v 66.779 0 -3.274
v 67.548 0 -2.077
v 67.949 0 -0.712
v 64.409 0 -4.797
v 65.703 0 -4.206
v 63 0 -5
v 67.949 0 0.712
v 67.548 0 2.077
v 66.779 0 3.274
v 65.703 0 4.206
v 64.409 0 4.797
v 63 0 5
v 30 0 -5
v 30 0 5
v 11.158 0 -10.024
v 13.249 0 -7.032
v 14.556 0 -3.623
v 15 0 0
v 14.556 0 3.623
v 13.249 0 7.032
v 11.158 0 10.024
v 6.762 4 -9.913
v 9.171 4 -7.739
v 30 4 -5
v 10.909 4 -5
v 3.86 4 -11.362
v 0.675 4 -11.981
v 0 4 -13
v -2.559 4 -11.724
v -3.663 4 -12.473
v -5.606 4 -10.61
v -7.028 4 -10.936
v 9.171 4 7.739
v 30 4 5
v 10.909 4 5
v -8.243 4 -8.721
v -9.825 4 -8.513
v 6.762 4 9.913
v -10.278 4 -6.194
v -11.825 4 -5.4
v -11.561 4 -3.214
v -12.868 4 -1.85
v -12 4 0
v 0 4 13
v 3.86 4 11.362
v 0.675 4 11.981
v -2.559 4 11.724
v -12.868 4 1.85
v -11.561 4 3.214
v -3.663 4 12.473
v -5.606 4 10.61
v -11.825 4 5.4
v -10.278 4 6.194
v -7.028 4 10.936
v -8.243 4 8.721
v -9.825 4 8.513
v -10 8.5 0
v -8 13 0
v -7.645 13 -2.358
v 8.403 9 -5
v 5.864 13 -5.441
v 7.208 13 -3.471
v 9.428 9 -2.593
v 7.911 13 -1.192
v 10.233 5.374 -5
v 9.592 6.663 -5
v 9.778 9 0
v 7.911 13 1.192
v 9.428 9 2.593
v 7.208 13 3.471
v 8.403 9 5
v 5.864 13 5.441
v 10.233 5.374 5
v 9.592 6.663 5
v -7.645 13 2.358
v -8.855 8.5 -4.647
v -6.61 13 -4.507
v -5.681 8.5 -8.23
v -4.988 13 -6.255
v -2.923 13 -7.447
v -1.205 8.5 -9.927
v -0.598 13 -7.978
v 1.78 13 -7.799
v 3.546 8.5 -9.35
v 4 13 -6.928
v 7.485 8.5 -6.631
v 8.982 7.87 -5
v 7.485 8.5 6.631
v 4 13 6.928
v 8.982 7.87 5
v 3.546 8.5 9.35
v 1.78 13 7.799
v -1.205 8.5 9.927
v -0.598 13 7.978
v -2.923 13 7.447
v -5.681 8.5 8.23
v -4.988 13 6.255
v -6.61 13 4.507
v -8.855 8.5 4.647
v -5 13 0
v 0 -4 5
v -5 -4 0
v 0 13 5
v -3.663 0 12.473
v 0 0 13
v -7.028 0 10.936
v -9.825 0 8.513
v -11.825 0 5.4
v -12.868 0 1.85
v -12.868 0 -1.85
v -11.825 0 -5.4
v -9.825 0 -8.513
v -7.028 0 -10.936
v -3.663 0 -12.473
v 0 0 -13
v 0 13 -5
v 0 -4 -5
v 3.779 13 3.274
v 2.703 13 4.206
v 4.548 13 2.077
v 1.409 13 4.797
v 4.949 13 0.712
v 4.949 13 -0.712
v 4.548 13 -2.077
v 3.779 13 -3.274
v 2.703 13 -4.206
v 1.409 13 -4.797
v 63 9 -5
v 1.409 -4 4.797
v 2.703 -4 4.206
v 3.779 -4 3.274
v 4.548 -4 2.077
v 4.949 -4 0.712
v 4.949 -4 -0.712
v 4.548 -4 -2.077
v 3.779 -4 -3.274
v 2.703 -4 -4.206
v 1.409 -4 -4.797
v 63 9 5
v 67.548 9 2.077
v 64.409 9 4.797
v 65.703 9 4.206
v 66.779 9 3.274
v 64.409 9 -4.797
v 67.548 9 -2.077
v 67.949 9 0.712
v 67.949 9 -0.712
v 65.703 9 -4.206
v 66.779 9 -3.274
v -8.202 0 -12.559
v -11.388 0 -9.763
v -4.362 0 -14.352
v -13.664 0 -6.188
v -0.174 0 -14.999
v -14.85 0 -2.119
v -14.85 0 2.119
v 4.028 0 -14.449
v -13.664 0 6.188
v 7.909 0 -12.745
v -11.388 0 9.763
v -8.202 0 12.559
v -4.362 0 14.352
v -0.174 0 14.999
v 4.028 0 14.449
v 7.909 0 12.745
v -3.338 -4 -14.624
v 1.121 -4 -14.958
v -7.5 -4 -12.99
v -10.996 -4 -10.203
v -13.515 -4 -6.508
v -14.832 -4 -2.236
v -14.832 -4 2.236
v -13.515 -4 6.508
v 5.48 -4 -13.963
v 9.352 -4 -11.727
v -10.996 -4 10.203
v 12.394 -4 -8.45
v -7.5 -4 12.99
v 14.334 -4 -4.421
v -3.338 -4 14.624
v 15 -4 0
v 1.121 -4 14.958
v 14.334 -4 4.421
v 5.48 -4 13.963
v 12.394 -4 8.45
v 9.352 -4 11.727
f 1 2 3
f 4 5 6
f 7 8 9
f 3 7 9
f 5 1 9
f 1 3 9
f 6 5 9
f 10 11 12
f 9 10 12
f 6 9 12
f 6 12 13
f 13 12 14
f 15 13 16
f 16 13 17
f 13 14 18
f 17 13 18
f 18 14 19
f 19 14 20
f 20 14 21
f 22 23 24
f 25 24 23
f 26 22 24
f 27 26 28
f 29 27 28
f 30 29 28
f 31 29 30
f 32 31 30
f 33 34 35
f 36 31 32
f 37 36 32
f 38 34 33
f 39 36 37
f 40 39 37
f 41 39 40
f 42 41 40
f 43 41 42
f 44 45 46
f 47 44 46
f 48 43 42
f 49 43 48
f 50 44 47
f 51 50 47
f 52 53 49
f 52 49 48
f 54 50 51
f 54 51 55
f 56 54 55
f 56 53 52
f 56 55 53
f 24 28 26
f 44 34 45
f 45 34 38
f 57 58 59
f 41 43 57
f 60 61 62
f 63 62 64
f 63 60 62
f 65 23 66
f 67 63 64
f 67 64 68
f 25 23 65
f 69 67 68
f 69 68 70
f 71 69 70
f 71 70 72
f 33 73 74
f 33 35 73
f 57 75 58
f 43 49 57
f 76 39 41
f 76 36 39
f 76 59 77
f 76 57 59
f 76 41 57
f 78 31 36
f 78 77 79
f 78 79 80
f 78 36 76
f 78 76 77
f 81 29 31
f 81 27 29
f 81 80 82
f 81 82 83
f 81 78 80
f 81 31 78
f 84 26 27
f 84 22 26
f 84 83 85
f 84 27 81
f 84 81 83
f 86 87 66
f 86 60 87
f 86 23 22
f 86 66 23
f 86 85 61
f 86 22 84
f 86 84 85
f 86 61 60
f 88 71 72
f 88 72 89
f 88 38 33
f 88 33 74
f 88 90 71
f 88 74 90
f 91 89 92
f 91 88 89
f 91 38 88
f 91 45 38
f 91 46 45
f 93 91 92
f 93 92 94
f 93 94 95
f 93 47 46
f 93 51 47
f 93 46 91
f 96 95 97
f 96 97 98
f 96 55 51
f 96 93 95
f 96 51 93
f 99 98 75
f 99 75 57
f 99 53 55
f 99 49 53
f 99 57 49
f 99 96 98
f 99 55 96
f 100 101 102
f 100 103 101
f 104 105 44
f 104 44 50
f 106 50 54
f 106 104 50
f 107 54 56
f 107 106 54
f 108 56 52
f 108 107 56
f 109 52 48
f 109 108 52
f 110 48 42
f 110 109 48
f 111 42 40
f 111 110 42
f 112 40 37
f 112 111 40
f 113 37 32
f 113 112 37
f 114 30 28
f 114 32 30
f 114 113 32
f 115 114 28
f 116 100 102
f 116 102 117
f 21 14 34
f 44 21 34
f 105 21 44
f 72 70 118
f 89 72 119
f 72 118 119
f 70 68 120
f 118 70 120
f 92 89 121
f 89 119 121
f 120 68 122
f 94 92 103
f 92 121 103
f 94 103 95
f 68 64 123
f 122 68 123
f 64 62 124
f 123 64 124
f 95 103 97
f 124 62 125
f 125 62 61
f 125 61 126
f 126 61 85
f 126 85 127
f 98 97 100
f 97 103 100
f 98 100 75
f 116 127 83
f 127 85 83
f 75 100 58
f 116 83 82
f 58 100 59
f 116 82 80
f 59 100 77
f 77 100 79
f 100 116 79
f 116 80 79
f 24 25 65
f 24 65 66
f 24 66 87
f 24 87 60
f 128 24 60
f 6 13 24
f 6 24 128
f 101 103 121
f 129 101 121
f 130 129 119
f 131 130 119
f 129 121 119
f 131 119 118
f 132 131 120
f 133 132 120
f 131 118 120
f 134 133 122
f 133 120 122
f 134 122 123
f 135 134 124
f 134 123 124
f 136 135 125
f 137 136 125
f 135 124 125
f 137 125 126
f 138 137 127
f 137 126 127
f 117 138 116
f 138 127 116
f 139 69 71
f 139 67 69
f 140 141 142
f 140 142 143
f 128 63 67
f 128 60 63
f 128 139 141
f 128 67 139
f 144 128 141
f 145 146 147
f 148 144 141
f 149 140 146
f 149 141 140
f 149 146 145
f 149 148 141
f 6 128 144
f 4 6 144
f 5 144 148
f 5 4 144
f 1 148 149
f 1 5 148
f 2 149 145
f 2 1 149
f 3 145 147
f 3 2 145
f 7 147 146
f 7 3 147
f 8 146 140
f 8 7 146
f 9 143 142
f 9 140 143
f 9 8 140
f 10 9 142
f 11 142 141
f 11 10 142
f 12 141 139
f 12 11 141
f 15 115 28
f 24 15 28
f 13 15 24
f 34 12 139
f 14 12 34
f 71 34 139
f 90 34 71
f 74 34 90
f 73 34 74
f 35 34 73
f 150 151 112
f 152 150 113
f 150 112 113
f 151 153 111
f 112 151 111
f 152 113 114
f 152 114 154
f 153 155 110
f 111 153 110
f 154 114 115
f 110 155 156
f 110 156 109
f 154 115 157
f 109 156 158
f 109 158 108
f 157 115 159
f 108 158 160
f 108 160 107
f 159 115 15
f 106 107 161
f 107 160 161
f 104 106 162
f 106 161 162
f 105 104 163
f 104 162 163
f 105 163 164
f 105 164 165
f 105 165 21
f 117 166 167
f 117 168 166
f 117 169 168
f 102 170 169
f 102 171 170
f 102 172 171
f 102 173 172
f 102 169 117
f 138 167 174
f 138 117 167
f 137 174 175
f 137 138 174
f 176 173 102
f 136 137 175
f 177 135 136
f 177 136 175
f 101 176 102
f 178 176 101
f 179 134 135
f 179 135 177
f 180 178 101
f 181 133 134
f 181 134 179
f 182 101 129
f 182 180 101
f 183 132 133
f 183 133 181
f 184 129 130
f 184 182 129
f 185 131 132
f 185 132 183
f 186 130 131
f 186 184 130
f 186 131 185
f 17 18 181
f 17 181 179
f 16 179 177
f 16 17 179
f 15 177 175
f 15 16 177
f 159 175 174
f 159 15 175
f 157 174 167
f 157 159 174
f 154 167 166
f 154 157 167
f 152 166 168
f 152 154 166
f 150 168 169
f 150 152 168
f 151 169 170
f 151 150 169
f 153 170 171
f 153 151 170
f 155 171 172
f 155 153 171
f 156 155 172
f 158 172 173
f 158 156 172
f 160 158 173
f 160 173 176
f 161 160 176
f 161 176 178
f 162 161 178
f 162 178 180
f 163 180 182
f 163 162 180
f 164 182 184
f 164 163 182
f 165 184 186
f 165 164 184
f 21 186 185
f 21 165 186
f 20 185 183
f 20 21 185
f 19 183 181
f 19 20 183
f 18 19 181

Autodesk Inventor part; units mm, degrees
ref_plane "YZ Plane" through (0, 0, 0) normal (1, 0, 0) x (0, 1, 0)
ref_plane "XZ Plane" through (0, 0, 0) normal (0, 1, 0) x (-1, 0, 0)
ref_plane "XY Plane" through (0, 0, 0) normal (0, 0, 1) x (1, 0, 0)
sketch "草图1" plane through (0, 0, 0) normal (0, 1, 0) x (-1, 0, 0)
  arc A0 (0, -13) -> (0, 13) centre (0, 0) ccw
  line L0 (0, 0) -> (-30, 0)
  line L1 (0, -13) -> (-30, -5)
  line L2 (-30, 5) -> (0, 13)
  line L3 (-30, 5) -> (-63, 5)
  line L4 (-63, -5) -> (-30, -5)
  arc A1 (-63, 5) -> (-63, -5) centre (-63, 0) ccw
  dimension "d0" = 26
  dimension "d10" = 10
extrude "拉伸1" add sketch "草图1" along normal blind 4
sketch "草图2" plane through (0, 0, 0) normal (0, -1, 0) x (1, 0, 0)
  line L0 (30, 5) -> (63, 5) projected
  line L1 (0, 13) -> (30, 5) projected
  arc A0 (0, 13) -> (0, -13) centre (0, 0) ccw projected
  line L2 (30, -5) -> (0, -13) projected
  line L3 (63, -5) -> (30, -5) projected
  circle A1 centre (0, 0) radius 15
  arc A2 (63, -5) -> (63, 5) centre (63, 0) ccw projected
  dimension "d7" = 30
extrude "拉伸2" add sketch "草图2" along normal blind 4 contours A1 L2 A0 L1 | L1 A0 L2 A1
sketch "草图3" plane through (0, 4, 0) normal (0, 1, 0) x (1, 0, 0)
  line L0 (0, -13) -> (30, -5) projected
  line L1 (30, -5) -> (63, -5) projected
  arc A0 (63, -5) -> (63, 5) centre (63, 0) ccw projected
  line L2 (63, 5) -> (30, 5) projected
  line L3 (30, 5) -> (0, 13) projected
  arc A1 (0, 13) -> (0, -13) centre (0, 0) ccw projected
  line L4 (0, -13) -> (30, -5) projected
  line L5 (30, -5) -> (0, -5)
  line L6 (0, -5) -> (0, 5)
  line L7 (0, 5) -> (30, 5)
extrude "拉伸3" add sketch "草图3" along normal blind 5 contours L5 L6 L7 L2 A0 L1
sketch "草图4" plane through (0, 0, 0) normal (0, 0, 1) x (1, 0, 0)
  line L0 (0, 0) -> (0, 0) projected
  line L1 (0, 0) -> (0, 4) projected
  line L2 (0, 4) -> (0, 4) projected
  line L3 (0, 0) -> (0, 4) projected
  line L4 (-15, -4) -> (15, -4) projected
  line L5 (11.1585, 0) -> (11.1585, 0) projected
  line L6 (11.1585, 0) -> (11.1585, 0) projected
  line L7 (0, 4) -> (-13, 4) projected
  line L8 (-13, 4) -> (-13, 0)
  line L9 (-15, 0) -> (11.1585, 0) projected
  line L10 (-12, 4) -> (-8, 13)
  line L11 (-8, 13) -> (0, 13)
  line L12 (30, 4) -> (0, 4) projected
  line L13 (0, 13) -> (0, 4)
  dimension "d14" = 1
  dimension "d15" = 9
  dimension "d16" = 8
revolve "旋转1" add sketch "草图4" angle 360 about axis through (0, 13, 0) along (0, -1, 0) contours L7 L10 L11 L13
sketch "草图5" plane through (0, 13, 0) normal (0, 1, 0) x (1, 0, 0)
  arc A0 (0, -5) -> (0, 5) centre (0, 0) ccw
  line L0 (0, -5) -> (-5, 0)
  line L1 (-5, 0) -> (0, 5)
  dimension "d18" = 10
extrude "拉伸4" cut sketch "草图5" against normal through all
properties part number "4-手柄" material "灰口铁"
